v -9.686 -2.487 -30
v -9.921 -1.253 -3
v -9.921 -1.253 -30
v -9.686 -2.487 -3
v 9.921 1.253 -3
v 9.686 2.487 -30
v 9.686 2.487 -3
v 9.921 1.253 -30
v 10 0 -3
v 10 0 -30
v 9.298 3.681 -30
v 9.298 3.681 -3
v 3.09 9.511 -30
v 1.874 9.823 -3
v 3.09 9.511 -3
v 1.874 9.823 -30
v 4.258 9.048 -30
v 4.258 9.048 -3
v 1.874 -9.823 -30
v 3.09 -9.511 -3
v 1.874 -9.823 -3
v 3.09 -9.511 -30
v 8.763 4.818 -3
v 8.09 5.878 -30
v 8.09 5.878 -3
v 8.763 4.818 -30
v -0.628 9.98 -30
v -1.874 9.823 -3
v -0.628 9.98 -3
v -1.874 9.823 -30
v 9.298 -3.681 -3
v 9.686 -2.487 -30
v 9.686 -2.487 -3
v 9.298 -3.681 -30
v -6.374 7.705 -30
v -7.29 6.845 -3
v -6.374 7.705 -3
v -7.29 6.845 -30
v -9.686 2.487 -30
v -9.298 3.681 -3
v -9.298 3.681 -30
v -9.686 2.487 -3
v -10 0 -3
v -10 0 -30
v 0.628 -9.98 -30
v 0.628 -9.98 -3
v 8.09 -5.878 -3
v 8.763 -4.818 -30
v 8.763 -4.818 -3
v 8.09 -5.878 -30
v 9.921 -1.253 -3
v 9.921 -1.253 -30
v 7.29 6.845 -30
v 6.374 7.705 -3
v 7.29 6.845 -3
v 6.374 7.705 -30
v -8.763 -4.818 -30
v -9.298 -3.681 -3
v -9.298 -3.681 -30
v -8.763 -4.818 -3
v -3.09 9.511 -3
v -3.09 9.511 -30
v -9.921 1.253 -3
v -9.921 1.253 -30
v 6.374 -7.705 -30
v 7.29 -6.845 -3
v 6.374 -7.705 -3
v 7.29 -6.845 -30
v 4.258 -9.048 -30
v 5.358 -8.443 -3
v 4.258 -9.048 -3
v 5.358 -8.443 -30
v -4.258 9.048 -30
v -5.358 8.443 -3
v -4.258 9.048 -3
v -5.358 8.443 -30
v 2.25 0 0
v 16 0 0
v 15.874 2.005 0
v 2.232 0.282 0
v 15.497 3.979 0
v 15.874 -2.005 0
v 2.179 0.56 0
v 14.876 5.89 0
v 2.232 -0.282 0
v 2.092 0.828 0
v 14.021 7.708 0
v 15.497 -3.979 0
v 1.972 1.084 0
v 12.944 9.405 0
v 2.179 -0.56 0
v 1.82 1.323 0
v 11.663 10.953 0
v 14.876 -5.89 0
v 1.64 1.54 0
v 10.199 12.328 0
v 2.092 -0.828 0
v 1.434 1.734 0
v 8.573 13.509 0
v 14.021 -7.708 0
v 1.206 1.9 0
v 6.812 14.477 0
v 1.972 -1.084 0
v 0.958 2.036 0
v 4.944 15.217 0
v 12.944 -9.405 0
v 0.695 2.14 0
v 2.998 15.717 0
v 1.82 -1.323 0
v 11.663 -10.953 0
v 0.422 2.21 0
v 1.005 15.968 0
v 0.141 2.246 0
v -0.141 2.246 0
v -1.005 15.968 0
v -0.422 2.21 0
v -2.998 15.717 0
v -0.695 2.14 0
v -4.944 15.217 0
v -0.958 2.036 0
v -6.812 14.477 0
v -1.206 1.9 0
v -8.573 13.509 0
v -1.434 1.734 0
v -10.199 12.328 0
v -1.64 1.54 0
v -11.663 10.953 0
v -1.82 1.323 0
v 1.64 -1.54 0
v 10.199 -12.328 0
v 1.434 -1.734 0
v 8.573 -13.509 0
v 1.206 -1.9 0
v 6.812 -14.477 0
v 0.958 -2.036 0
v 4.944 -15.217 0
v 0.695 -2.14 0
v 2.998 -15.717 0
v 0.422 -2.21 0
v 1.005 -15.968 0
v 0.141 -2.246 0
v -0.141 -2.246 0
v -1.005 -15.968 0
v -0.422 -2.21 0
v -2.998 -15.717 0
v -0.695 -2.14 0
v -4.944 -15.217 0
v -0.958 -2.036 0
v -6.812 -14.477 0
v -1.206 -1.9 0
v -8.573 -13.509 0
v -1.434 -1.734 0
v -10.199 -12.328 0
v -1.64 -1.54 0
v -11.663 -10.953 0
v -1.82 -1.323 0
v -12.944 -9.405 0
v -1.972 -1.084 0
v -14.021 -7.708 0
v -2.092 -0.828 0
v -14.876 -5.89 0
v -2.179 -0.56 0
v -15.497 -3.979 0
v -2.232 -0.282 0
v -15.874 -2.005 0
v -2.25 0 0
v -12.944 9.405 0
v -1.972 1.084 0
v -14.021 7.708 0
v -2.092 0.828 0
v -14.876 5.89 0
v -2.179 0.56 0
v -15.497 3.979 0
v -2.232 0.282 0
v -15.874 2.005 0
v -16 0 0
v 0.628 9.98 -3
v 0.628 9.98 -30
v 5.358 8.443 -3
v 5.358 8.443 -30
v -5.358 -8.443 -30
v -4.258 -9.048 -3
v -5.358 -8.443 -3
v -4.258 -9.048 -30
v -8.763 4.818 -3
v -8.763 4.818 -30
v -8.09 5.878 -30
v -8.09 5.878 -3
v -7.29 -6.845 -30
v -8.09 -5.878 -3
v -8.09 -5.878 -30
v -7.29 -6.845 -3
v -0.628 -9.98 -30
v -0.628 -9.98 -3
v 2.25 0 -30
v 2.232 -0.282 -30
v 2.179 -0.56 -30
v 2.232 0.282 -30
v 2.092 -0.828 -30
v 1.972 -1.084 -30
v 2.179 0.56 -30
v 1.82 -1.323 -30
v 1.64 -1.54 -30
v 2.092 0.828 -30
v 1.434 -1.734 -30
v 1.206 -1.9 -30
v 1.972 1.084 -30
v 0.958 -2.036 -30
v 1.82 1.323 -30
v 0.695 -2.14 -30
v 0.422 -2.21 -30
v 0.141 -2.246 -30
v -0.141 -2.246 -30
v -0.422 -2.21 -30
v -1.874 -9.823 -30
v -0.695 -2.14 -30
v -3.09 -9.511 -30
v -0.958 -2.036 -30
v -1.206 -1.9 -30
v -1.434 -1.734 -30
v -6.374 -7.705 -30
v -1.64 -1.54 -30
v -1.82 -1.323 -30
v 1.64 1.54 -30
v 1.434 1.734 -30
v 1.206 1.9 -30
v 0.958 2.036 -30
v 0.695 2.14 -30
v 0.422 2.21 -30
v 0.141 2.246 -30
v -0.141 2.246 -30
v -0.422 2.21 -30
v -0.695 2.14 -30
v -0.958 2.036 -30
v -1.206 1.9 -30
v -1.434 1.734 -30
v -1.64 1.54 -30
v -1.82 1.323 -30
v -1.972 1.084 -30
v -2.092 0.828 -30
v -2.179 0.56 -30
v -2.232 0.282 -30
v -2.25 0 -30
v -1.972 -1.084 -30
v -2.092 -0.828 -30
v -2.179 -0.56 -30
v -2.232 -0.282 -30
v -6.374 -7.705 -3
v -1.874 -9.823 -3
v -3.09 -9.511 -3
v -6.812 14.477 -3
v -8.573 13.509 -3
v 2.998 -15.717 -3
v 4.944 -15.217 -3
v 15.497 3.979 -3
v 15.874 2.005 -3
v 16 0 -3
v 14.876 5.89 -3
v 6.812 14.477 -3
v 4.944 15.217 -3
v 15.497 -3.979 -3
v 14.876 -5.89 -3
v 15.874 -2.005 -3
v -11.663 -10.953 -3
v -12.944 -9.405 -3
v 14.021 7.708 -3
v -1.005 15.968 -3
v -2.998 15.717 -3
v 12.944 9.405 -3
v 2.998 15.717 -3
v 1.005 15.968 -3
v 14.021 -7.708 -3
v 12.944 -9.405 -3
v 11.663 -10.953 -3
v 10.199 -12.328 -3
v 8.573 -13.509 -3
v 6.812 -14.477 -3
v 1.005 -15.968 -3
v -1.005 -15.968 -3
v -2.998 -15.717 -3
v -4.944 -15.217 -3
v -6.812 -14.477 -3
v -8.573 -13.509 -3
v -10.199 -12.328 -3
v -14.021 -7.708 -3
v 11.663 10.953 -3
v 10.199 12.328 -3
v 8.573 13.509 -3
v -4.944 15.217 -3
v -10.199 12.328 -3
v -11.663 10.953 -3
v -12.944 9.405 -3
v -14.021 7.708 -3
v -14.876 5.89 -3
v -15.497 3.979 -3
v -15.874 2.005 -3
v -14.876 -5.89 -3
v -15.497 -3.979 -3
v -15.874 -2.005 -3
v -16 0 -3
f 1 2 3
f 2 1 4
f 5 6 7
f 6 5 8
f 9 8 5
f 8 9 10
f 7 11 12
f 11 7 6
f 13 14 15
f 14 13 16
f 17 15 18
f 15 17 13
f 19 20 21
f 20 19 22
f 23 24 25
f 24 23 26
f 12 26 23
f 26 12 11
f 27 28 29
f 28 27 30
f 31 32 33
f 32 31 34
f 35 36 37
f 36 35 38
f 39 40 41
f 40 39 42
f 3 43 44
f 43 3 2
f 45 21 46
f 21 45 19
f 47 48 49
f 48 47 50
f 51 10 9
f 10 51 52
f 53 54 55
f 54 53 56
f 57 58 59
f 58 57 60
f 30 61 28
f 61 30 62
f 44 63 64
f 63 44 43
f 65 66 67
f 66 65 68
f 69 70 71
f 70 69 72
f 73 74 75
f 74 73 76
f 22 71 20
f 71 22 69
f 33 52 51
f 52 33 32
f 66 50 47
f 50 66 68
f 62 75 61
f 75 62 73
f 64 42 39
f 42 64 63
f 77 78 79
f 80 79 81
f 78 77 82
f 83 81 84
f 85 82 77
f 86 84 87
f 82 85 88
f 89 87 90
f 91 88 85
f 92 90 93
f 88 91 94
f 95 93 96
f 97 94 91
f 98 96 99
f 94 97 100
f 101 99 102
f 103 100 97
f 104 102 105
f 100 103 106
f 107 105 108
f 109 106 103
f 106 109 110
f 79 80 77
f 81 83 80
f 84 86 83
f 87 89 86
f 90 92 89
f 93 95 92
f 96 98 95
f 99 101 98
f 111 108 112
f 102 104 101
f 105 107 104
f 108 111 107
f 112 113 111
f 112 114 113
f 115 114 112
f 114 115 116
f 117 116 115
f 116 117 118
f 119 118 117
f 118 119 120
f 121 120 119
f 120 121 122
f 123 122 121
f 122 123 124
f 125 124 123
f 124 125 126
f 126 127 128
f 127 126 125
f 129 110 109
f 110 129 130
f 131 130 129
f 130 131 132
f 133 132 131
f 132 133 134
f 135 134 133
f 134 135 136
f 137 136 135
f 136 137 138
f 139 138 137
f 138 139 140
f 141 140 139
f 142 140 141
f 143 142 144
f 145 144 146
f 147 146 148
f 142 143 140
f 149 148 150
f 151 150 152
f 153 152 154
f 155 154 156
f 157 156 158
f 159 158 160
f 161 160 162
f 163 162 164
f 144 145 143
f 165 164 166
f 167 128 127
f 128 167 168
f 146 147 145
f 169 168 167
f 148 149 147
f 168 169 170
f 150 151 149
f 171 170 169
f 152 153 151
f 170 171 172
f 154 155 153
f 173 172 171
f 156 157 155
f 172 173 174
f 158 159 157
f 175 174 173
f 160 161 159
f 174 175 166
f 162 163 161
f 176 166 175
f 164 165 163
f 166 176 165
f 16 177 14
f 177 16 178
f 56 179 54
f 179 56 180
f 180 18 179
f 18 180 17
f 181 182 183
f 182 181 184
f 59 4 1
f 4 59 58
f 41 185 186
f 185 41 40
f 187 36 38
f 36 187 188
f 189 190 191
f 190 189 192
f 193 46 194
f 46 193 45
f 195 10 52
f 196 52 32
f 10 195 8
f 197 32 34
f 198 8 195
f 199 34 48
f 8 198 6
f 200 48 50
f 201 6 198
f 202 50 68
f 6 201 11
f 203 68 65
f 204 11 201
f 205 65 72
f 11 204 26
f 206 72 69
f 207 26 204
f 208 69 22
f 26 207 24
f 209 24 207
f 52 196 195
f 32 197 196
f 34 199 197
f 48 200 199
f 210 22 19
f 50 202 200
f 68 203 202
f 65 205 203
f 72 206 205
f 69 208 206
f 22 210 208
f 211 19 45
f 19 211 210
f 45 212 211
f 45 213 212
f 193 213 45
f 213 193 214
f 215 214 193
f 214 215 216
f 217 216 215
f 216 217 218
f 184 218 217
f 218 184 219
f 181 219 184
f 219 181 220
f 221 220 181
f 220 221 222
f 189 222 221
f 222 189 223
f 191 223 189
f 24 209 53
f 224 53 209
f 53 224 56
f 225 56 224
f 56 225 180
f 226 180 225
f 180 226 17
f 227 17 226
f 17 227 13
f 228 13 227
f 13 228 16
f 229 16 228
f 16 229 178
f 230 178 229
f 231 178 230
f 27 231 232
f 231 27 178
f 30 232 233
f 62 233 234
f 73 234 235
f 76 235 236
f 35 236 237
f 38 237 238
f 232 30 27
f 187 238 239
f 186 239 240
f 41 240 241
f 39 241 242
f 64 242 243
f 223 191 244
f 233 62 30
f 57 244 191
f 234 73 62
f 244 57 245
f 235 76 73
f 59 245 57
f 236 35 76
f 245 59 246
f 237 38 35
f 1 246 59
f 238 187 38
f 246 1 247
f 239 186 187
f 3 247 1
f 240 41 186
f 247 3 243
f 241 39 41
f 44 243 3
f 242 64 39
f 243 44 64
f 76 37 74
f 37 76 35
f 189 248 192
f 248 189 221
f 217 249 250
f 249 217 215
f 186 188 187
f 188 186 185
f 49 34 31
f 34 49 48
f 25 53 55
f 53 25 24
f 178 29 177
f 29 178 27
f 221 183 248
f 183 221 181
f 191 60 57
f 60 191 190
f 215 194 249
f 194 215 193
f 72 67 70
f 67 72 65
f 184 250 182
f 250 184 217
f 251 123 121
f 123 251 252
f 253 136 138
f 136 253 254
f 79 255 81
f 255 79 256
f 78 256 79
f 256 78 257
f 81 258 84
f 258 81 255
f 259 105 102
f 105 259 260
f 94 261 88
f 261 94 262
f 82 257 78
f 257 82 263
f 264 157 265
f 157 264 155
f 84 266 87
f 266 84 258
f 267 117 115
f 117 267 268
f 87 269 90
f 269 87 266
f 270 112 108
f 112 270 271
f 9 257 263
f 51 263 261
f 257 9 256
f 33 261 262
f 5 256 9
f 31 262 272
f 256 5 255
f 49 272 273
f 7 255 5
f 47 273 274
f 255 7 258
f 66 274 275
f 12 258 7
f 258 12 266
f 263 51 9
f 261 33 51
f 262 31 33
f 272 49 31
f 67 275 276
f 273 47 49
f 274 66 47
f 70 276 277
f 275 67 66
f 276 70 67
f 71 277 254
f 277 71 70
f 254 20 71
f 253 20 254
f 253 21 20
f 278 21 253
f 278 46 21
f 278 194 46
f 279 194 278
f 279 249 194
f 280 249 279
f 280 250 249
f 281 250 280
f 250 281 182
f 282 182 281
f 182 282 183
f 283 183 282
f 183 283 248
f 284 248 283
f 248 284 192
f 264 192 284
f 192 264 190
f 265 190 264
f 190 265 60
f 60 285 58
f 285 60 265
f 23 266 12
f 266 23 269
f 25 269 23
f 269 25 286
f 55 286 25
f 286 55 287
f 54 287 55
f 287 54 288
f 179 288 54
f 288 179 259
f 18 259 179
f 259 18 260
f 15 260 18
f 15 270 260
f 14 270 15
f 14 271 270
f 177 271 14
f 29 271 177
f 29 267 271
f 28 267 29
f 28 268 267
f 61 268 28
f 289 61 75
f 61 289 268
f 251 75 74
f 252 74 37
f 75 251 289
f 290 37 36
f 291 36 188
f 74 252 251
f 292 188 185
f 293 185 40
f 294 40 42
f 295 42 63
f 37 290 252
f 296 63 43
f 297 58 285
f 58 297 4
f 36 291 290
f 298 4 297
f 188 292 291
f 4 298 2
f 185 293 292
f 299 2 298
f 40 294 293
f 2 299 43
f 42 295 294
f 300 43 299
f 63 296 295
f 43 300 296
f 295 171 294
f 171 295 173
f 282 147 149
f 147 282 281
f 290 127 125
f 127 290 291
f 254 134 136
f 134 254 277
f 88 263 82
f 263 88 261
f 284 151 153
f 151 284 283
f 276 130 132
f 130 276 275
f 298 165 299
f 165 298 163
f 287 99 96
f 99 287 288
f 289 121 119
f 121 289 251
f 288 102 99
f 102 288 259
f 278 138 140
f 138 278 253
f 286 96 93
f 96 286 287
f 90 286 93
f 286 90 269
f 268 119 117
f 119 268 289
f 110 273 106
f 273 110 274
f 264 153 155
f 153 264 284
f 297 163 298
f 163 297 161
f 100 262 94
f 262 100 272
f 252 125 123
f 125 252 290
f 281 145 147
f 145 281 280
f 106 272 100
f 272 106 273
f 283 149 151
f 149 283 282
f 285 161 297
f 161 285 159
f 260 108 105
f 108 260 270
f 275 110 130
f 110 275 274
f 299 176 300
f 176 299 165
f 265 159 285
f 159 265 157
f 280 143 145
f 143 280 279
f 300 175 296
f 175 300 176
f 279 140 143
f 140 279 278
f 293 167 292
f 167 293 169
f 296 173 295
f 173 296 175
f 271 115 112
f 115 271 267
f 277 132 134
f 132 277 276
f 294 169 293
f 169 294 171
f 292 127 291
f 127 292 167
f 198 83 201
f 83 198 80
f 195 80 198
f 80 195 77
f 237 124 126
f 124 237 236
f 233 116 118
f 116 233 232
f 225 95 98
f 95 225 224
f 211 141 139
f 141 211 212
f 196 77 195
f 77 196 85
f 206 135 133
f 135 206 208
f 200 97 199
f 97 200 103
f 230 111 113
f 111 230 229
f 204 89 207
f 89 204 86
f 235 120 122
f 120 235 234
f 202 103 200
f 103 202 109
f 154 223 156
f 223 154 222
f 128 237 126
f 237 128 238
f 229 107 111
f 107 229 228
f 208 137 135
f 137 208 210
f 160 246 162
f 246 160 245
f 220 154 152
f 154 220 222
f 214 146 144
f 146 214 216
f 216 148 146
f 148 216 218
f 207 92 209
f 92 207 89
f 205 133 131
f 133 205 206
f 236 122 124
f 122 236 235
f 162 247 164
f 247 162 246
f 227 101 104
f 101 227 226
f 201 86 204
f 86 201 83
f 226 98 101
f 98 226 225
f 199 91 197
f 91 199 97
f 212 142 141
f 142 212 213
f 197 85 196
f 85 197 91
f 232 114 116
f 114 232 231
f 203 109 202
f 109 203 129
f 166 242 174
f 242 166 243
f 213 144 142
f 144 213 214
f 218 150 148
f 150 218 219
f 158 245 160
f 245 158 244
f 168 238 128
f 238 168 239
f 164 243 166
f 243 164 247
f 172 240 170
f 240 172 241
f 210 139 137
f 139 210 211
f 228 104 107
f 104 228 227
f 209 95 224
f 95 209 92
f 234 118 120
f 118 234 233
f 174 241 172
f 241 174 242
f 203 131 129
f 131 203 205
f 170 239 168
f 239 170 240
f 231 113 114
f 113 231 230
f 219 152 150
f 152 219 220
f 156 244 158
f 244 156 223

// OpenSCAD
$fn = 50;


difference() {
	union() {
		translate(v = [0, 0, -30.0000000000]) {
			cylinder(h = 30, r = 10.0000000000);
		}
		translate(v = [0, 0, -3.0000000000]) {
			cylinder(h = 3, r = 16.0000000000);
		}
	}
	union() {
		#translate(v = [0, 0, -30]) {
			cylinder(h = 30, r = 2.2500000000);
		}
	}
}
